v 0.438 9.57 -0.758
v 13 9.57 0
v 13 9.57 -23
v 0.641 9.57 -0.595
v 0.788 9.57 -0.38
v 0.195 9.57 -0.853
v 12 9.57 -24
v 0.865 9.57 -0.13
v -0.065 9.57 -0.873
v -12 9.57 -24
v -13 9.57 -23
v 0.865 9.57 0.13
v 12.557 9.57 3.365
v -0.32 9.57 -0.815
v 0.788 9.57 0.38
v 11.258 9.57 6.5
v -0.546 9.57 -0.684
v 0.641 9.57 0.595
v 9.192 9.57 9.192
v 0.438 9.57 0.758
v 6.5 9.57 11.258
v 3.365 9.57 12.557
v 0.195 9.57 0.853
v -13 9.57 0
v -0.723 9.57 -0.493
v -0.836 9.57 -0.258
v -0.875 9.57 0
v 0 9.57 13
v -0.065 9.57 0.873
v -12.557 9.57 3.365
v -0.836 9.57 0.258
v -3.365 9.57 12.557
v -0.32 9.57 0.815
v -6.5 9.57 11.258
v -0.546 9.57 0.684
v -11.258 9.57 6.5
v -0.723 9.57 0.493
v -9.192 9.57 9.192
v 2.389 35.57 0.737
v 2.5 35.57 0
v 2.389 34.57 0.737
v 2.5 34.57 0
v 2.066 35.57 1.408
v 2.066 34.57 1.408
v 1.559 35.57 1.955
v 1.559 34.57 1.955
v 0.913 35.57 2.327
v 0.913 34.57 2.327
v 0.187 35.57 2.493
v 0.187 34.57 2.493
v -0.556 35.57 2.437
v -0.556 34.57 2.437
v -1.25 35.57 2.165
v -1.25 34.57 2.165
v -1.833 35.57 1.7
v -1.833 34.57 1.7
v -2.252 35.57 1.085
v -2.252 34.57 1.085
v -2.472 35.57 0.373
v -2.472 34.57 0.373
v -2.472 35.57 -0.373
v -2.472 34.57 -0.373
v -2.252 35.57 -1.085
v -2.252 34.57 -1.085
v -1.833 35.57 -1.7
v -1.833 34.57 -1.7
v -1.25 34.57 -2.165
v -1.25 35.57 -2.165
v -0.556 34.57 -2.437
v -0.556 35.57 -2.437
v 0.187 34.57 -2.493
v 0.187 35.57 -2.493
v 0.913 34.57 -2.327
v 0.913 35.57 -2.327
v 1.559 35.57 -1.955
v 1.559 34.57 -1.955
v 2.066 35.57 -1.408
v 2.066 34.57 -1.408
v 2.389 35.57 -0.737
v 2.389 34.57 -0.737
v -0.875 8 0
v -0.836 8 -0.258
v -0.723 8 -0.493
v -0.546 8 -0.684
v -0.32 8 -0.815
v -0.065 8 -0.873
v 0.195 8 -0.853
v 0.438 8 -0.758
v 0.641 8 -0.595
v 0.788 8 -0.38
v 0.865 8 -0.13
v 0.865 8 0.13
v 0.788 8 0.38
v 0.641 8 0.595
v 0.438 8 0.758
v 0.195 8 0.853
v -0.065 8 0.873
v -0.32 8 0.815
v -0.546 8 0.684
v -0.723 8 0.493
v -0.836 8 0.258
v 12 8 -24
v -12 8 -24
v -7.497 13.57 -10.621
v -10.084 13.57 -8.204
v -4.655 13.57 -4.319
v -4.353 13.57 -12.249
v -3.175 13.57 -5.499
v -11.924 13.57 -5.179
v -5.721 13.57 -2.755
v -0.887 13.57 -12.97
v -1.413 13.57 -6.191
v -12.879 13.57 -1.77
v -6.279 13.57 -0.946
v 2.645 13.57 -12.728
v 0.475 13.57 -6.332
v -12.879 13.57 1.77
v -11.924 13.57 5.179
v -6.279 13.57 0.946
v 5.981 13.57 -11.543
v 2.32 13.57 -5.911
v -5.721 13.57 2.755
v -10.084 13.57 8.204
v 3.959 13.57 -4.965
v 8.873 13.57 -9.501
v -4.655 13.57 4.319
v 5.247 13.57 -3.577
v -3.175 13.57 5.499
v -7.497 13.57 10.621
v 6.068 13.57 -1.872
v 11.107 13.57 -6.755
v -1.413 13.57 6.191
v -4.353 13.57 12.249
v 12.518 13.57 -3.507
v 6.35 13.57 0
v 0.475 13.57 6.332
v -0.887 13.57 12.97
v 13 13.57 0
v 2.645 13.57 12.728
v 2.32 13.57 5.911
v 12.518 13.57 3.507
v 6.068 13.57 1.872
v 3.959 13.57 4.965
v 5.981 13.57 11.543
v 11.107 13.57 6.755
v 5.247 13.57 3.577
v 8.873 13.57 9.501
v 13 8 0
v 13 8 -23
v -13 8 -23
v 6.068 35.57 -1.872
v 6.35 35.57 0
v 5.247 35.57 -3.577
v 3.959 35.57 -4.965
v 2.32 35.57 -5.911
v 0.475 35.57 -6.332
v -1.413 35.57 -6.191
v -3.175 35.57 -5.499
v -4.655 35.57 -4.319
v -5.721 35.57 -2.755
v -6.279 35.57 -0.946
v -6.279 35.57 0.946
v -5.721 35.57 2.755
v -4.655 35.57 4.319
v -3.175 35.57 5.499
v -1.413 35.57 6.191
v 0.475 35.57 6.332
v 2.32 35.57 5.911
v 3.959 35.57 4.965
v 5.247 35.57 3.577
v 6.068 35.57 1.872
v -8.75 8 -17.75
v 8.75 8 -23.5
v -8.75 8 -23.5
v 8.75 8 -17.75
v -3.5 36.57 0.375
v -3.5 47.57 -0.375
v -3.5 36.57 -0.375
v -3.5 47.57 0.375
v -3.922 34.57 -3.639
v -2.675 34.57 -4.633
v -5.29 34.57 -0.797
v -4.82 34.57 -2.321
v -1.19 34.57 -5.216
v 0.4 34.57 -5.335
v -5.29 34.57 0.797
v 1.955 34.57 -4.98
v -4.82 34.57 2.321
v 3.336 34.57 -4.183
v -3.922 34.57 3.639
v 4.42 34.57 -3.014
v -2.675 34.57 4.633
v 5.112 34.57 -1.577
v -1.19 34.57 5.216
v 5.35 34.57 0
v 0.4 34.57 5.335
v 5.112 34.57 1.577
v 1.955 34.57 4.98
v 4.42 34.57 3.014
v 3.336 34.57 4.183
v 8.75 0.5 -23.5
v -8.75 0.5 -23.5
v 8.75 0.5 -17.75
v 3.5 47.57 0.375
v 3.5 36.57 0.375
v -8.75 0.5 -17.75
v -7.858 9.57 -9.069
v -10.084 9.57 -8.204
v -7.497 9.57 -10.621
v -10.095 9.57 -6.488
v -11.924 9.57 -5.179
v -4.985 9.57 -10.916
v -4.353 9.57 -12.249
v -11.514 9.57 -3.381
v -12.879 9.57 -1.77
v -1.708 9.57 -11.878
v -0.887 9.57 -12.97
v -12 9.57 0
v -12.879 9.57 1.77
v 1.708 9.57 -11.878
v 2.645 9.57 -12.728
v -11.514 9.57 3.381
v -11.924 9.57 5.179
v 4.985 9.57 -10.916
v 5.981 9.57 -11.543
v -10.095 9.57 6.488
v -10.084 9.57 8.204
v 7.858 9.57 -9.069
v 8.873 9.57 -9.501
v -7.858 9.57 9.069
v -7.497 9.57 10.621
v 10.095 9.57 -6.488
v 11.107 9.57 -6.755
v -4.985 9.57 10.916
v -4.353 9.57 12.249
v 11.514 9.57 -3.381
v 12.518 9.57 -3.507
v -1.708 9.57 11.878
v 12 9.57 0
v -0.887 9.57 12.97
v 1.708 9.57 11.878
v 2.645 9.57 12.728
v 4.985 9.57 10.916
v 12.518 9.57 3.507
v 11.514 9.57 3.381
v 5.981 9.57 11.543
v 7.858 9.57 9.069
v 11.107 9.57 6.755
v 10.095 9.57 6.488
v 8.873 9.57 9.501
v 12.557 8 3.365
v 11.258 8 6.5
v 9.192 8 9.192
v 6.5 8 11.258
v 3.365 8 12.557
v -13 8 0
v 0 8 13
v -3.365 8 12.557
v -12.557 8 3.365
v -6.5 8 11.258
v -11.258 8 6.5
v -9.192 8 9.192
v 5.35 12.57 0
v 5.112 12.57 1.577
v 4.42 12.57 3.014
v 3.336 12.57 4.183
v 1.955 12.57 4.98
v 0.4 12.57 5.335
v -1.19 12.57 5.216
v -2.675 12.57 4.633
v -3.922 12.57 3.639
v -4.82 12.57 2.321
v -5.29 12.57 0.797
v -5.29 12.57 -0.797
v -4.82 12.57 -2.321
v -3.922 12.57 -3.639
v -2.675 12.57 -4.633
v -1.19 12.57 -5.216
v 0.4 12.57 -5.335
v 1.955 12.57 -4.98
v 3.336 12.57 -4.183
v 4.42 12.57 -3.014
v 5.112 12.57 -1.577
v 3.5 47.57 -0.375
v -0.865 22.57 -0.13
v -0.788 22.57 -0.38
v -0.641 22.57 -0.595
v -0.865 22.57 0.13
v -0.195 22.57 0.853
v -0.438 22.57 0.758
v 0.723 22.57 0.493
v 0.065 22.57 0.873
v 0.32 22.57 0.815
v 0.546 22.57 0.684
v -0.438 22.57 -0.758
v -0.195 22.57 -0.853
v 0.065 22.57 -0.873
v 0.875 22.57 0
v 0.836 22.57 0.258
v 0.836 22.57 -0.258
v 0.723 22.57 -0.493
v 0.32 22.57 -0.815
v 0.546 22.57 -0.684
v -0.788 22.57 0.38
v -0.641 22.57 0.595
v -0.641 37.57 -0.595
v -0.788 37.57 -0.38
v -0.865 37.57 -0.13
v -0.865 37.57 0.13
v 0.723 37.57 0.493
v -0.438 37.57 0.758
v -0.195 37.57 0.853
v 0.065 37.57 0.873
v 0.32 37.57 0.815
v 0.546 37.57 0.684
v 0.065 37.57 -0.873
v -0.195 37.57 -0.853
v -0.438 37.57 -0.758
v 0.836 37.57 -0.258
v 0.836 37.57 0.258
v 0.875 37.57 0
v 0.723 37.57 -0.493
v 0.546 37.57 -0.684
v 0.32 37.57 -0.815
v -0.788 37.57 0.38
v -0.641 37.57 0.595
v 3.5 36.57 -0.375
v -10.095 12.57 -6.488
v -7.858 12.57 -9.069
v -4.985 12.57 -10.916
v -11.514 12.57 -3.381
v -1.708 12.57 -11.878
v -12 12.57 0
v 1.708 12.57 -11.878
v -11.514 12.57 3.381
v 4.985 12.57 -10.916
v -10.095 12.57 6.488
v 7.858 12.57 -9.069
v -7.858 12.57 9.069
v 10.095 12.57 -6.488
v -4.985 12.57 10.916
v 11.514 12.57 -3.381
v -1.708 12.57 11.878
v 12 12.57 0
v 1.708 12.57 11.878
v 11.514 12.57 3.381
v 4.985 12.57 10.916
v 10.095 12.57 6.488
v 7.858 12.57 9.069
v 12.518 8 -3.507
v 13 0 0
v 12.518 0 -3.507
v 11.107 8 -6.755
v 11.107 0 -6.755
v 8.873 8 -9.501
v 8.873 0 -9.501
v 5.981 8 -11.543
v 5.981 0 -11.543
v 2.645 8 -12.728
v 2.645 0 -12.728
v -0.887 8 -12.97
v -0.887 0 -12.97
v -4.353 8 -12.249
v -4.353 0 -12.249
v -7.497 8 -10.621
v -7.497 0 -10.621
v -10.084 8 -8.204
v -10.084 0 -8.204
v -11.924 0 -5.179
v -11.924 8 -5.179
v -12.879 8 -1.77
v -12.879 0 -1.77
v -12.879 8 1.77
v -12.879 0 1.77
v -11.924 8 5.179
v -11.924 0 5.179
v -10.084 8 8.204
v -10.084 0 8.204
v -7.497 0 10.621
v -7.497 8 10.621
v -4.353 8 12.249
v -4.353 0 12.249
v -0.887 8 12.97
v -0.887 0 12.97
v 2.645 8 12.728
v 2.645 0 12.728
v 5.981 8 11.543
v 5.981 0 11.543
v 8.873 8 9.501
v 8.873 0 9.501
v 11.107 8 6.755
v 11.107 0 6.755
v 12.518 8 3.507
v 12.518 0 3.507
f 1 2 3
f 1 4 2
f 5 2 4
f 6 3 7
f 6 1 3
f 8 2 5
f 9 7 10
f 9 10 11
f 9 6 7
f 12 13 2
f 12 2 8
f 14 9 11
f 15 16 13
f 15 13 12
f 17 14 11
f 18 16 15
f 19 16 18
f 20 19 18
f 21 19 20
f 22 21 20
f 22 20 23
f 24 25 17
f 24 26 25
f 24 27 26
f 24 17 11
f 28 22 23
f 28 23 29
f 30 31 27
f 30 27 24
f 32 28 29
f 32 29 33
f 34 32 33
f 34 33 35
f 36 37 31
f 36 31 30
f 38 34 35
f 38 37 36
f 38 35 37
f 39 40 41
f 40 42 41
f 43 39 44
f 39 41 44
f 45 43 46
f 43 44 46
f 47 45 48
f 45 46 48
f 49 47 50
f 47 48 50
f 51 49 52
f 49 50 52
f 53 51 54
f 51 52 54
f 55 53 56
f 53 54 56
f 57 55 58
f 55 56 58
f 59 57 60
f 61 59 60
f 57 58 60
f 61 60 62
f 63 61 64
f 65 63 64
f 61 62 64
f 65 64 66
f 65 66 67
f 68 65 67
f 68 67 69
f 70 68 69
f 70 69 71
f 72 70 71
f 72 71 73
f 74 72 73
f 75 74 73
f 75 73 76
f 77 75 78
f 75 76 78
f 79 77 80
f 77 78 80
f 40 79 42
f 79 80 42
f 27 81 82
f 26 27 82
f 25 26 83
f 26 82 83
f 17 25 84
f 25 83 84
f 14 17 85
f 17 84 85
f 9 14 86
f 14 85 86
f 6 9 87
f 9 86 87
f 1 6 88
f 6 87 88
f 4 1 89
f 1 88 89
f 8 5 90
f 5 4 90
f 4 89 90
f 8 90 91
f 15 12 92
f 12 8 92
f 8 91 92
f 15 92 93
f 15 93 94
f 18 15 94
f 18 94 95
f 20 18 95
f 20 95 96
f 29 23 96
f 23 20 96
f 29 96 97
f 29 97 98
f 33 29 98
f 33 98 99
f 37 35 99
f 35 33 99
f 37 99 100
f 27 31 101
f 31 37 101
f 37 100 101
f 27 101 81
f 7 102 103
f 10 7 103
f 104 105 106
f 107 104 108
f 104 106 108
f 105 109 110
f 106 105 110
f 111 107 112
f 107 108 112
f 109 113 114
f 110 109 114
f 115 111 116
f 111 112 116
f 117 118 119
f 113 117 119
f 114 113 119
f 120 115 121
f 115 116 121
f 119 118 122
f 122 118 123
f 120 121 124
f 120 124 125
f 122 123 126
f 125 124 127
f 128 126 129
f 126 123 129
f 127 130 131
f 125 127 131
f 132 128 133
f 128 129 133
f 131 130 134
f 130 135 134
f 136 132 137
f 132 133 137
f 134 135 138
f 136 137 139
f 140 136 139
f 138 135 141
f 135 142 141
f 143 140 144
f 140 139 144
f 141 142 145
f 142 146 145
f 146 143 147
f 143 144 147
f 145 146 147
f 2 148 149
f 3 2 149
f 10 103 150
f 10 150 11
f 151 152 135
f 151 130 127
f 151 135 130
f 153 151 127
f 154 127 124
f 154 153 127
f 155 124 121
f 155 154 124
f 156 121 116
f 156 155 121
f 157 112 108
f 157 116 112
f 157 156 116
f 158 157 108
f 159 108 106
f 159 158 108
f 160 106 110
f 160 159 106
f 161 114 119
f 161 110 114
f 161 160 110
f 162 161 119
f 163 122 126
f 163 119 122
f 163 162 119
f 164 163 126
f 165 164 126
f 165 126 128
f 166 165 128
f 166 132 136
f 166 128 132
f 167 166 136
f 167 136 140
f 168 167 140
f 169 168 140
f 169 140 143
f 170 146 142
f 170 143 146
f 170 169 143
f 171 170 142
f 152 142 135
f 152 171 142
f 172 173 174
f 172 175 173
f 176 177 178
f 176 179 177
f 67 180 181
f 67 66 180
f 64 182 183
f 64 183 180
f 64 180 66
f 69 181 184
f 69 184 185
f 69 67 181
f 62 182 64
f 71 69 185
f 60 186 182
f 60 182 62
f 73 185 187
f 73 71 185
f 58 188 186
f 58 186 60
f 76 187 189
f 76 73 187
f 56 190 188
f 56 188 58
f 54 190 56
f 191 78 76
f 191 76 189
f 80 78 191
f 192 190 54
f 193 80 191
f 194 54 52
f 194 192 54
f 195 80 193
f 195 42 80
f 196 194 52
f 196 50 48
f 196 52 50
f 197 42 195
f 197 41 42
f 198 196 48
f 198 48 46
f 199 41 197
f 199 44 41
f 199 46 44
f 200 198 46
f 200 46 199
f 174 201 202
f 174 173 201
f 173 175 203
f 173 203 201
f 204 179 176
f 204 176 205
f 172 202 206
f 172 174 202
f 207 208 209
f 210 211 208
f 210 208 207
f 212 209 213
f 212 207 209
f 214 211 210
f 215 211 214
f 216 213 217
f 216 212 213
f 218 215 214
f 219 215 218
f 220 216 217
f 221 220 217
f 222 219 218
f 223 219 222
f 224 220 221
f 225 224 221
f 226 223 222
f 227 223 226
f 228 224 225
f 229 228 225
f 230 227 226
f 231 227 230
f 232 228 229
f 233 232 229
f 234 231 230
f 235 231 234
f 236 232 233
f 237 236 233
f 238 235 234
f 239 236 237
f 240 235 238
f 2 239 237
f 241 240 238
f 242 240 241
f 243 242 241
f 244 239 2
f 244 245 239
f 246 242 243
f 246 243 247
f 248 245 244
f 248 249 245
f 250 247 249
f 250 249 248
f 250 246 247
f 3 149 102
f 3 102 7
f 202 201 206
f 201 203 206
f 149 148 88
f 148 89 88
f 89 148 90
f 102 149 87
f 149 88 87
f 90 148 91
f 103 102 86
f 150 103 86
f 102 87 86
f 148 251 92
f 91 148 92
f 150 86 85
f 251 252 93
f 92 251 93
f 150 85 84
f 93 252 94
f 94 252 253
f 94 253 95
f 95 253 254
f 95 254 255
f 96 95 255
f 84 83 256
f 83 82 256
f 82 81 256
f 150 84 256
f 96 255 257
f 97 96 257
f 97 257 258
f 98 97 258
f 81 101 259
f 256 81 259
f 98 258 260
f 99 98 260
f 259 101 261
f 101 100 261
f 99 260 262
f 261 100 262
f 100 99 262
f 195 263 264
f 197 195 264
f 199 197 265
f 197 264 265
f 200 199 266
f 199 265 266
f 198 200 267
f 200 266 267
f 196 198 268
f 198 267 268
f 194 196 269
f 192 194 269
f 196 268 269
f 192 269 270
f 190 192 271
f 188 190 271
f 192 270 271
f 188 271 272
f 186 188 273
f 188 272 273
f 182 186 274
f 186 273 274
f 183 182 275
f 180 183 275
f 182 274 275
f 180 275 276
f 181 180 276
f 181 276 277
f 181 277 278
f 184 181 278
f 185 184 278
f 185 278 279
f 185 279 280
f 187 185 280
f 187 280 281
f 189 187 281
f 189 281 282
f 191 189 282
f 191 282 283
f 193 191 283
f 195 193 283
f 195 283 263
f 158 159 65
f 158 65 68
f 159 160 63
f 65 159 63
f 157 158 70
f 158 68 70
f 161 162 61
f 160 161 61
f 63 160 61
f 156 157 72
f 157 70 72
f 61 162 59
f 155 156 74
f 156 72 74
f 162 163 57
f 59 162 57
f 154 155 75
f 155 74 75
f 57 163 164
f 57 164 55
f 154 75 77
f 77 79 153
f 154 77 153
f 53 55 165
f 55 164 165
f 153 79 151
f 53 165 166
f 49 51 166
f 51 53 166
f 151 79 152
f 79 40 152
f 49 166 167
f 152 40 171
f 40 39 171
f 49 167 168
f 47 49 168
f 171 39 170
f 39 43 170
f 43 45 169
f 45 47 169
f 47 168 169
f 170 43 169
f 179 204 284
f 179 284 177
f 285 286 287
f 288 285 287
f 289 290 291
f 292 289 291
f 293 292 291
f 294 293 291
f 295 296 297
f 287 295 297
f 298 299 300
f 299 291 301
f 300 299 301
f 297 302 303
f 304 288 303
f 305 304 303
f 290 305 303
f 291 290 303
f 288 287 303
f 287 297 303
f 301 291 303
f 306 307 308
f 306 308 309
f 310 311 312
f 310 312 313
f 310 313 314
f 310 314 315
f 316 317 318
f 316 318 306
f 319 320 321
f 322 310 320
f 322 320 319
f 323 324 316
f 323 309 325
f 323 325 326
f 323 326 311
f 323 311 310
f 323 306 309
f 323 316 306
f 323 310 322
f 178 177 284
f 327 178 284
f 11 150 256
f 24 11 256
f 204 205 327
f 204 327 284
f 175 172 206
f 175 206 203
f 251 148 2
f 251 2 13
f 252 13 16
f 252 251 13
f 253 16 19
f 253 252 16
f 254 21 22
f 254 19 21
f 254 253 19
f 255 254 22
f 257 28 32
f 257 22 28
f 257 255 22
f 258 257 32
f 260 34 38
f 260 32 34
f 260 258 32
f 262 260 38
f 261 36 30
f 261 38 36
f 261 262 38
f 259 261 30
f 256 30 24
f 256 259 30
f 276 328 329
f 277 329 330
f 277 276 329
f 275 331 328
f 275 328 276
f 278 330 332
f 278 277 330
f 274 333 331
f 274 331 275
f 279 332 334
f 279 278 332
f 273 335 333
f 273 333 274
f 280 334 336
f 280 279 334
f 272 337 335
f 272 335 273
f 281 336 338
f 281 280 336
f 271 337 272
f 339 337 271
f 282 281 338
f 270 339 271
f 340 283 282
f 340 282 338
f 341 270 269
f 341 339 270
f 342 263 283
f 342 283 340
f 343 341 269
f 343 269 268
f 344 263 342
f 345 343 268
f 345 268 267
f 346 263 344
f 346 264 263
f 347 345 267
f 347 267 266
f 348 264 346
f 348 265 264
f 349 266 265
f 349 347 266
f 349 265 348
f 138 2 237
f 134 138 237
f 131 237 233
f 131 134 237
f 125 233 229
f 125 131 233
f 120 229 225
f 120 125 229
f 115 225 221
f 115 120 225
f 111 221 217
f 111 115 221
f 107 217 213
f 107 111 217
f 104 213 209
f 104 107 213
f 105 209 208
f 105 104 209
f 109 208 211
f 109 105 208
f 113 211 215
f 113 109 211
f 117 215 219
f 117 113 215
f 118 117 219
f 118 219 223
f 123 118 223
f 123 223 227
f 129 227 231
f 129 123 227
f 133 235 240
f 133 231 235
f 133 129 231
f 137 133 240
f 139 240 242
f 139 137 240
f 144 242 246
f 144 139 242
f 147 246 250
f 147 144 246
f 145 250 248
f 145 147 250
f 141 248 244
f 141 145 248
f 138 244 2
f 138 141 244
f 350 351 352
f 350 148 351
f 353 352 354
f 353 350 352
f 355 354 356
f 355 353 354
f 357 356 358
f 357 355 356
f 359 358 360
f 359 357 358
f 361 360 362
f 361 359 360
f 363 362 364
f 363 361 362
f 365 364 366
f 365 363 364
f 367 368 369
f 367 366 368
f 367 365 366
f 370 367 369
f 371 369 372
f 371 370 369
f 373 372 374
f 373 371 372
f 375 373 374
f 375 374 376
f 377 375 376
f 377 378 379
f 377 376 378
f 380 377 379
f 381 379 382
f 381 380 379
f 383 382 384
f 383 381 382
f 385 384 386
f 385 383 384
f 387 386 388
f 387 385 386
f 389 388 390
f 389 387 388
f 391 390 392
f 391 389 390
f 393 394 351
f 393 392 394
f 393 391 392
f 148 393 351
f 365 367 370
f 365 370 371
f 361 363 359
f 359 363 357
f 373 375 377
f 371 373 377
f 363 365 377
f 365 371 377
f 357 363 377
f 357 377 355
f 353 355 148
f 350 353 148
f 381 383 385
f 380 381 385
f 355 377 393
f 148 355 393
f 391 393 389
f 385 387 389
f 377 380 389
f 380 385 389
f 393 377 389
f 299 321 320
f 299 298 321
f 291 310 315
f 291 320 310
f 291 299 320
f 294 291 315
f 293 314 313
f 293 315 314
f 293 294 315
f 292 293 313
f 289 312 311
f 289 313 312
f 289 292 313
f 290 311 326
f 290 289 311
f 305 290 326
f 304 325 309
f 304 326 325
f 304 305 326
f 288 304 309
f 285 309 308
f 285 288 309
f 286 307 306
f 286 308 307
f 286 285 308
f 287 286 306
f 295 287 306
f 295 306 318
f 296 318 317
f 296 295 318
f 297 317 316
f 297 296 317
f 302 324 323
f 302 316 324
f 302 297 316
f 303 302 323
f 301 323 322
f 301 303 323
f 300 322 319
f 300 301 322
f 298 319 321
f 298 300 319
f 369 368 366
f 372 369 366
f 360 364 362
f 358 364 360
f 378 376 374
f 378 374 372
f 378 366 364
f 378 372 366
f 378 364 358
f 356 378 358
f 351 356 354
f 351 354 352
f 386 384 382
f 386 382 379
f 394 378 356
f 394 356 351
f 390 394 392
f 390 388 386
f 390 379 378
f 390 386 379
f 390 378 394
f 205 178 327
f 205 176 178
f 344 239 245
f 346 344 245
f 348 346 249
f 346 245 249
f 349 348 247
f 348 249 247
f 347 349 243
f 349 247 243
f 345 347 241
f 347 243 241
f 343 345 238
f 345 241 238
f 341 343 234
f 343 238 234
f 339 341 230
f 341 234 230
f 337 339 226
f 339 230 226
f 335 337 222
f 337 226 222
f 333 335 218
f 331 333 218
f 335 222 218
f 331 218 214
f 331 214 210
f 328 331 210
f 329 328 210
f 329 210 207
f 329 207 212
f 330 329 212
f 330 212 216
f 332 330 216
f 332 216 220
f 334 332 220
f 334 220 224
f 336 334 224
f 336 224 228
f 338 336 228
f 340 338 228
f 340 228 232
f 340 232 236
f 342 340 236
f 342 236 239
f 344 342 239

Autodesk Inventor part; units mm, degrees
ref_plane "YZ Plane" through (0, 0, 0) normal (1, 0, 0) x (0, 1, 0)
ref_plane "XZ Plane" through (0, 0, 0) normal (0, 1, 0) x (-1, 0, 0)
ref_plane "XY Plane" through (0, 0, 0) normal (0, 0, 1) x (1, 0, 0)
sketch "Sketch1" plane through (0, 0, 0) normal (0, 0, 1) x (1, 0, 0)
  line L0 (0, 0) -> (13, 0)
  line L1 (13, 0) -> (13, 8)
  line L2 (13, 8) -> (0, 8)
  line L3 (0, 8) -> (0, 0)
  line L4 (12, 9.57) -> (13, 9.57)
  line L5 (13, 9.57) -> (13, 13.57)
  line L6 (13, 13.57) -> (6.35, 13.57)
  line L7 (6.35, 13.57) -> (6.35, 35.57)
  line L8 (6.35, 35.57) -> (2.5, 35.57)
  line L9 (2.5, 35.57) -> (2.5, 34.57)
  line L10 (2.5, 34.57) -> (5.35, 34.57)
  line L11 (5.35, 34.57) -> (5.35, 12.57)
  line L12 (5.35, 12.57) -> (12, 12.57)
  line L13 (12, 12.57) -> (12, 9.57)
  line L14 (0.875, 22.57) -> (0, 22.57)
  line L15 (0, 22.57) -> (0, 37.57)
  line L16 (0, 37.57) -> (0.875, 37.57)
  line L17 (0.875, 37.57) -> (0.875, 22.57)
  line L18 (-3.5, 36.57) -> (3.5, 36.57)
  line L19 (3.5, 36.57) -> (3.5, 47.57)
  line L20 (3.5, 47.57) -> (-3.5, 47.57)
  line L21 (-3.5, 47.57) -> (-3.5, 36.57)
  line L22 (-3.5, 36.57) -> (3.5, 47.57) construction
  line L23 (3.5, 36.57) -> (-3.5, 47.57) construction
  point P0 (0, 42.07)
  point P1 (0, 42.07)
  dimension "d0" = 8
  dimension "d1" = 4
  dimension "d2" = 13
  dimension "d3" = 1.57
  dimension "d4" = 22
  dimension "d6" = 1
  dimension "d7" = 1
  dimension "d8" = 1
  dimension "d9" = 1
  dimension "d10" = 6.35
  dimension "d11" = 0.875
  dimension "d12" = 2.5
  dimension "d13" = 2
  dimension "d14" = 15
  dimension "d15" = 11
  dimension "d16" = 7
  dimension "d17" = 1
revolve "Revolution1" add sketch "Sketch1" angle 360 about axis through (0, 8, 0) along (0, -1, 0) contours L3 L2 L1 L0 | L13 L12 L11 L10 L9 L8 L7 L6 L5 L4
revolve "Revolution2" add sketch "Sketch1" angle 360 about axis through (0, 22.57, 0) along (0, 1, 0) separate body contours L14 L15 L18 L17 | L18 L15 L16 L17
extrude "Extrusion1" add sketch "Sketch1" against normal mid plane 0.75 separate body contours L18 L15 L16 L17 | L17 L16 L15 L18 L21 L20 L19
sketch "Sketch2" plane through (0, 0, 0) normal (0, 1, 0) x (-1, 0, 0)
  circle A0 centre (0, 0) radius 0.875 projected
  arc A1 (13, 0) -> (-13, 0) centre (0, 0) ccw
  line L0 (-13, 0) -> (-13, -24)
  line L1 (-13, -24) -> (13, -24)
  line L2 (13, -24) -> (13, 0)
  line L3 (-8.75, -23.5) -> (8.75, -23.5)
  line L4 (8.75, -23.5) -> (8.75, -17.75)
  line L5 (8.75, -17.75) -> (-8.75, -17.75)
  line L6 (-8.75, -17.75) -> (-8.75, -23.5)
  line L7 (-8.75, -23.5) -> (8.75, -17.75) construction
  line L8 (8.75, -23.5) -> (-8.75, -17.75) construction
  point P0 (0, 0)
  point P1 (-13, 0)
  point P2 (-13, 0)
  point P3 (-13, 0)
  point P4 (0, -20.625)
  point P5 (0, -20.625)
  point P6 (0, -24)
  dimension "d23" = 37
  dimension "d24" = 17.5
  dimension "d25" = 5.75
  dimension "d26" = 0.5
extrude "Extrusion2" add sketch "Sketch2" along normal up to surface (1.57 mm away) from surface at 8 separate body contours L2 L1 L0 A1 | L6 L5 L4 L3
extrude "Extrusion3" add sketch "Sketch2" against normal blind 7.5 from surface at 8 separate body contours L6 L5 L4 L3
chamfer "Chamfer1" distance 1 angle 45 2 edges at (-13, 8.785, -24) (13, 8.785, -24)
properties part number "AT 25-5246" material "ABS Plastic"
